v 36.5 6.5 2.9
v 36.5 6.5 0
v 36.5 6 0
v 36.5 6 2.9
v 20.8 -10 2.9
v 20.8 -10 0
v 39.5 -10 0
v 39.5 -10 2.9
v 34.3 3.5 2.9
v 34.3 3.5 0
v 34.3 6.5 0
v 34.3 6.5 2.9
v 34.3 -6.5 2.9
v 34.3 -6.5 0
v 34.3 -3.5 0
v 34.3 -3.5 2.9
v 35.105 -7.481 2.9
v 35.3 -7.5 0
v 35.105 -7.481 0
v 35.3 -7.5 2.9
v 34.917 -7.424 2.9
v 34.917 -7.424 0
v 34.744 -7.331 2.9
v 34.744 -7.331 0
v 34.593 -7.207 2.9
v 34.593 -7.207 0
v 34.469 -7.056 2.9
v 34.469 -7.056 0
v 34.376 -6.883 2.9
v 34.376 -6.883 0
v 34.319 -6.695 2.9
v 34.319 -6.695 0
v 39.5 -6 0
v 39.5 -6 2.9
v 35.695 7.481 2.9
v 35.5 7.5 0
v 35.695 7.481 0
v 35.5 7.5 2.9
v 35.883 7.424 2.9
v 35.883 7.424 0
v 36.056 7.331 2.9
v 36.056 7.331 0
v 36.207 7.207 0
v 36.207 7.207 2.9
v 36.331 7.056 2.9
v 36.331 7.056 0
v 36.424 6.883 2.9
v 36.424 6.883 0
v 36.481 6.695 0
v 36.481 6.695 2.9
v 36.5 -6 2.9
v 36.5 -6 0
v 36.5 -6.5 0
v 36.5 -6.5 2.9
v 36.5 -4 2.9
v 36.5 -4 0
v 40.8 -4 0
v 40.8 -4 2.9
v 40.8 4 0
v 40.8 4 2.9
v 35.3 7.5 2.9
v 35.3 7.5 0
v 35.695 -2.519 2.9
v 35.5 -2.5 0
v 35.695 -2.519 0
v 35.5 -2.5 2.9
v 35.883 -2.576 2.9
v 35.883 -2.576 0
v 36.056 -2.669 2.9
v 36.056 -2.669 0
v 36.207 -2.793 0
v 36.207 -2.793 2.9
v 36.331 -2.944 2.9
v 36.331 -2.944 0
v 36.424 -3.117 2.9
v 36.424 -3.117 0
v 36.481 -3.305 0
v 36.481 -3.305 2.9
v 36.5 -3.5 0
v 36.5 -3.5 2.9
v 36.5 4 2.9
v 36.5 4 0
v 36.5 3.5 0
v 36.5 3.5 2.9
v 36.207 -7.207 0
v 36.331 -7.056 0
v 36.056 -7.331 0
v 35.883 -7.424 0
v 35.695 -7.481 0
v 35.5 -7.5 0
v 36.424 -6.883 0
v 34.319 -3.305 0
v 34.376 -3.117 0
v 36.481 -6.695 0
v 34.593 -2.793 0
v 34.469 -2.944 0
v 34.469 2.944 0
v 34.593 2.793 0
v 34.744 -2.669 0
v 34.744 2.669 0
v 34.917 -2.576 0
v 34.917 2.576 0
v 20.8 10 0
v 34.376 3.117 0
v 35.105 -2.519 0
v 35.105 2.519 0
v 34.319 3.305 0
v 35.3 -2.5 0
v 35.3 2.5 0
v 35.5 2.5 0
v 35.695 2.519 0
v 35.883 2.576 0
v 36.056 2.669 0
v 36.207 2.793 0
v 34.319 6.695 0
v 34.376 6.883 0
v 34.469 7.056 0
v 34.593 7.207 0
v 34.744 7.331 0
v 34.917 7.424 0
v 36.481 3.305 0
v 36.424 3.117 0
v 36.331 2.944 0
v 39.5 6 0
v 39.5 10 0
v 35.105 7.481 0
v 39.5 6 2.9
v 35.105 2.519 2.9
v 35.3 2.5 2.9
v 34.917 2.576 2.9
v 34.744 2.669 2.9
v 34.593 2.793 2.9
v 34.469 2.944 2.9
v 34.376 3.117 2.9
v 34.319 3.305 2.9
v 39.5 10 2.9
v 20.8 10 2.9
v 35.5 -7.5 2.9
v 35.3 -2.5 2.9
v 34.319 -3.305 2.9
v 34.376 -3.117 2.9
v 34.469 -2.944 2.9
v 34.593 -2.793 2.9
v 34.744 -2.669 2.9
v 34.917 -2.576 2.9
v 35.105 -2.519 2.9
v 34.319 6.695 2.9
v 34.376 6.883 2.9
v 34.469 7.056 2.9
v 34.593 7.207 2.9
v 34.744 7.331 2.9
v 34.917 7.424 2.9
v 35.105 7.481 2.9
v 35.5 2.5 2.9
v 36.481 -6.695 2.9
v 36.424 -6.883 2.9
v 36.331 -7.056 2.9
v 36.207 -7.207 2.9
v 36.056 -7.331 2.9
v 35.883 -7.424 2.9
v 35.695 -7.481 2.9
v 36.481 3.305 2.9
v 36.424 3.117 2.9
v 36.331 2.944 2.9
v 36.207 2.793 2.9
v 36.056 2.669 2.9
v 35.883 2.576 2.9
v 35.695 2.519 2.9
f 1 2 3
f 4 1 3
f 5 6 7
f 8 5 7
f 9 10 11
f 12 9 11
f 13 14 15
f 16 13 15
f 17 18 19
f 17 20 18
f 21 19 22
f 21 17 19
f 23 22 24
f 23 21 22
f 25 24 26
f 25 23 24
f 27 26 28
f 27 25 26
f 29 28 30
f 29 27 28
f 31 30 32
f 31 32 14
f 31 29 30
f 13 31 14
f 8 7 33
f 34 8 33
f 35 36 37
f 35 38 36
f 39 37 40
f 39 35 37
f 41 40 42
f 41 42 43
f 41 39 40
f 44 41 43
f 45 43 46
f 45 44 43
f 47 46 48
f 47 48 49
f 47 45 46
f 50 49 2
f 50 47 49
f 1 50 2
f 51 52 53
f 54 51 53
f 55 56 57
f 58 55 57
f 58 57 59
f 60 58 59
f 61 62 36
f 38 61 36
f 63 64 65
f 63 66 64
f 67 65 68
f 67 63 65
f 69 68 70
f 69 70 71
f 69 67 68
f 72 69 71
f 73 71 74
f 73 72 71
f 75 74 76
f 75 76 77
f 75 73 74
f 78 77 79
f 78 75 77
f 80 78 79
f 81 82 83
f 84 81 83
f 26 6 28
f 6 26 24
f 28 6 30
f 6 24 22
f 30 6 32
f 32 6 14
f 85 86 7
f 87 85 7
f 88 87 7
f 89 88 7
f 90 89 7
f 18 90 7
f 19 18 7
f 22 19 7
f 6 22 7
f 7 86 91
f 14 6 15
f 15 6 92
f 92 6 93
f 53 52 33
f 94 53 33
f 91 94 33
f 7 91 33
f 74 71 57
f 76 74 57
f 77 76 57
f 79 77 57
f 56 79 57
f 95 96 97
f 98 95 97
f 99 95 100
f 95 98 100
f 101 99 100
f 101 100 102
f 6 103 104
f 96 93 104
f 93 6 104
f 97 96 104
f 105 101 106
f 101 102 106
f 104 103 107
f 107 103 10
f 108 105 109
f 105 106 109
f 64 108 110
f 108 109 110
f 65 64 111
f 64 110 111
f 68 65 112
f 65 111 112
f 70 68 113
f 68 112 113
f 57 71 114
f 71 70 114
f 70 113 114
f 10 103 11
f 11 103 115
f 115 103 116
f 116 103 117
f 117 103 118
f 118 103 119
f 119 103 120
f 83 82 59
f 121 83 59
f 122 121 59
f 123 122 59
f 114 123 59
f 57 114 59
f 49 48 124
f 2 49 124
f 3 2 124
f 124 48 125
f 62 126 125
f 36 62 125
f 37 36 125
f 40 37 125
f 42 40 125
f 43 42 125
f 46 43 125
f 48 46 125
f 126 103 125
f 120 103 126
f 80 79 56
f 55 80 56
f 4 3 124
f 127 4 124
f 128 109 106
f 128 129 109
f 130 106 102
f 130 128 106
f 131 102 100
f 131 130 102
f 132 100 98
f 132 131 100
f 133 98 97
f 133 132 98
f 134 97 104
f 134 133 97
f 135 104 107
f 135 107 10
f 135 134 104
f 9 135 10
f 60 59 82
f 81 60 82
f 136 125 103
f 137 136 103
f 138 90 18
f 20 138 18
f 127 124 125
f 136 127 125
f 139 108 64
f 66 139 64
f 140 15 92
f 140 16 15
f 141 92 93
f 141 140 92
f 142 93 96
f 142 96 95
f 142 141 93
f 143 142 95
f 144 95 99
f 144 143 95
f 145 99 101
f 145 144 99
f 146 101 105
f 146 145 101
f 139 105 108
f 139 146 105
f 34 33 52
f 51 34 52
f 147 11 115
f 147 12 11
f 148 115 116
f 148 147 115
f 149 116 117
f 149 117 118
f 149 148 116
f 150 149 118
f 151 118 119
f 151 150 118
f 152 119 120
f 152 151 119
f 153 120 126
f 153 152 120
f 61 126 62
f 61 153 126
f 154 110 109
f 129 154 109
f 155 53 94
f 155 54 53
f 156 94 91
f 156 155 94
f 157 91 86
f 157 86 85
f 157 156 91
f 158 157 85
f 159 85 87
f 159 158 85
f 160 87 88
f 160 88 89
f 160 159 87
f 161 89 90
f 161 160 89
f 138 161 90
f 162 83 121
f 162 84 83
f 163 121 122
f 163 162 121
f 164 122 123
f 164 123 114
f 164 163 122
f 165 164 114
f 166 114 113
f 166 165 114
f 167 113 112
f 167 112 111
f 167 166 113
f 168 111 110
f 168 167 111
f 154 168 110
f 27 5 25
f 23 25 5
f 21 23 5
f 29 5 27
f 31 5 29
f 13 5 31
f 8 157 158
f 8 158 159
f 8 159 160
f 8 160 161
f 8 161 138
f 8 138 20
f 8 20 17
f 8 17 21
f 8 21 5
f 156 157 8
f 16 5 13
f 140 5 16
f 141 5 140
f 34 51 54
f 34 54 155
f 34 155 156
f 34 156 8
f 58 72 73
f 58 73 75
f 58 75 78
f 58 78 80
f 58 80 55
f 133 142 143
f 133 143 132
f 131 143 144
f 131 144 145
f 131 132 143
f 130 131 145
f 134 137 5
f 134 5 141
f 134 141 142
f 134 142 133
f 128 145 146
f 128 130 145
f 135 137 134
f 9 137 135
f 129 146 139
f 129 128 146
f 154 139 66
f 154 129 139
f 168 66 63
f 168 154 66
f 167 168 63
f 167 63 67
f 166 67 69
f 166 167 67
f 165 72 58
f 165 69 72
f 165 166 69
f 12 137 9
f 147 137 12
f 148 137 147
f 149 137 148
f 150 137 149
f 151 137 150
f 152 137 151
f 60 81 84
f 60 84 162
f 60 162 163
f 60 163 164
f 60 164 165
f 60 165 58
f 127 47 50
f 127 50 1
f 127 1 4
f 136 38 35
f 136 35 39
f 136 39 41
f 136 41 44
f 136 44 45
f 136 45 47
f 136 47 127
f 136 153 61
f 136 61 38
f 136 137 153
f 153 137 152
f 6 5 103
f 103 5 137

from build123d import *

# Parameters (mm, degrees)
BASE_SHAPE_DEPTH       = 2.9
SKETCH2_R              = 5
FORWARD_CUT_TEMP_DEPTH = 1
FILLET1_R              = 1
CUT_EXTRUDE1_REACH     = 44.108
SKETCH4_W              = 61.6
SKETCH4_H              = 20


with BuildPart() as part:
    # Sketch1 → Base shape (new body)
    with BuildSketch(Plane.XY):
        Polygon((39.5, 10), (-39.5, 10), (-39.5, 6), (-36.5, 6), (-36.5, 7.5), (-34.3, 7.5), (-34.3, 2.5), (-36.5, 2.5), (-36.5, 4), (-40.8, 4), (-40.8, -4), (-36.5, -4), (-36.5, -2.5), (-34.3, -2.5), (-34.3, -7.5), (-36.5, -7.5), (-36.5, -6), (-39.5, -6), (-39.5, -10), (39.5, -10), (39.5, -6), (36.5, -6), (36.5, -7.5), (34.3, -7.5), (34.3, -2.5), (36.5, -2.5), (36.5, -4), (40.8, -4), (40.8, 4), (36.5, 4), (36.5, 2.5), (34.3, 2.5), (34.3, 7.5), (36.5, 7.5), (36.5, 6), (39.5, 6), align=None)
    extrude(amount=BASE_SHAPE_DEPTH)

    # Sketch2 → Forward cut (temp) (cut)
    with BuildSketch(Plane.XY.offset(2.9)):
        Circle(SKETCH2_R)
    extrude(amount=-FORWARD_CUT_TEMP_DEPTH, mode=Mode.SUBTRACT)

    # Fillet1
    fillet1_edges = [part.edges().sort_by_distance(p)[0] for p in [
        (36.5, -7.5, 1.45),
        (36.5, 2.5, 1.45),
        (34.3, 2.5, 1.45),
        (34.3, -7.5, 1.45),
        (36.5, -2.5, 1.45),
        (36.5, 7.5, 1.45),
        (34.3, -2.5, 1.45),
        (34.3, 7.5, 1.45),
        (-36.5, -2.5, 1.45),
        (-34.3, -2.5, 1.45),
        (-34.3, -7.5, 1.45),
        (-36.5, -7.5, 1.45),
        (-36.5, 2.5, 1.45),
        (-34.3, 2.5, 1.45),
        (-34.3, 7.5, 1.45),
        (-36.5, 7.5, 1.45),
    ]]
    fillet(fillet1_edges, radius=FILLET1_R)

    # Sketch4 → Cut-Extrude1 (cut, up to next)
    with BuildSketch(Plane.XY.offset(2.9), mode=Mode.PRIVATE) as cut_extrude1_sk1:
        with Locations((-10, 0)):
            Rectangle(SKETCH4_W, SKETCH4_H)
    cut_extrude1_tool1 = extrude(cut_extrude1_sk1.sketch, amount=-CUT_EXTRUDE1_REACH, mode=Mode.PRIVATE) & part.part
    add(cut_extrude1_tool1.solids().sort_by_distance((-10, 0, 2.9))[0], mode=Mode.SUBTRACT)


solid = part.part
